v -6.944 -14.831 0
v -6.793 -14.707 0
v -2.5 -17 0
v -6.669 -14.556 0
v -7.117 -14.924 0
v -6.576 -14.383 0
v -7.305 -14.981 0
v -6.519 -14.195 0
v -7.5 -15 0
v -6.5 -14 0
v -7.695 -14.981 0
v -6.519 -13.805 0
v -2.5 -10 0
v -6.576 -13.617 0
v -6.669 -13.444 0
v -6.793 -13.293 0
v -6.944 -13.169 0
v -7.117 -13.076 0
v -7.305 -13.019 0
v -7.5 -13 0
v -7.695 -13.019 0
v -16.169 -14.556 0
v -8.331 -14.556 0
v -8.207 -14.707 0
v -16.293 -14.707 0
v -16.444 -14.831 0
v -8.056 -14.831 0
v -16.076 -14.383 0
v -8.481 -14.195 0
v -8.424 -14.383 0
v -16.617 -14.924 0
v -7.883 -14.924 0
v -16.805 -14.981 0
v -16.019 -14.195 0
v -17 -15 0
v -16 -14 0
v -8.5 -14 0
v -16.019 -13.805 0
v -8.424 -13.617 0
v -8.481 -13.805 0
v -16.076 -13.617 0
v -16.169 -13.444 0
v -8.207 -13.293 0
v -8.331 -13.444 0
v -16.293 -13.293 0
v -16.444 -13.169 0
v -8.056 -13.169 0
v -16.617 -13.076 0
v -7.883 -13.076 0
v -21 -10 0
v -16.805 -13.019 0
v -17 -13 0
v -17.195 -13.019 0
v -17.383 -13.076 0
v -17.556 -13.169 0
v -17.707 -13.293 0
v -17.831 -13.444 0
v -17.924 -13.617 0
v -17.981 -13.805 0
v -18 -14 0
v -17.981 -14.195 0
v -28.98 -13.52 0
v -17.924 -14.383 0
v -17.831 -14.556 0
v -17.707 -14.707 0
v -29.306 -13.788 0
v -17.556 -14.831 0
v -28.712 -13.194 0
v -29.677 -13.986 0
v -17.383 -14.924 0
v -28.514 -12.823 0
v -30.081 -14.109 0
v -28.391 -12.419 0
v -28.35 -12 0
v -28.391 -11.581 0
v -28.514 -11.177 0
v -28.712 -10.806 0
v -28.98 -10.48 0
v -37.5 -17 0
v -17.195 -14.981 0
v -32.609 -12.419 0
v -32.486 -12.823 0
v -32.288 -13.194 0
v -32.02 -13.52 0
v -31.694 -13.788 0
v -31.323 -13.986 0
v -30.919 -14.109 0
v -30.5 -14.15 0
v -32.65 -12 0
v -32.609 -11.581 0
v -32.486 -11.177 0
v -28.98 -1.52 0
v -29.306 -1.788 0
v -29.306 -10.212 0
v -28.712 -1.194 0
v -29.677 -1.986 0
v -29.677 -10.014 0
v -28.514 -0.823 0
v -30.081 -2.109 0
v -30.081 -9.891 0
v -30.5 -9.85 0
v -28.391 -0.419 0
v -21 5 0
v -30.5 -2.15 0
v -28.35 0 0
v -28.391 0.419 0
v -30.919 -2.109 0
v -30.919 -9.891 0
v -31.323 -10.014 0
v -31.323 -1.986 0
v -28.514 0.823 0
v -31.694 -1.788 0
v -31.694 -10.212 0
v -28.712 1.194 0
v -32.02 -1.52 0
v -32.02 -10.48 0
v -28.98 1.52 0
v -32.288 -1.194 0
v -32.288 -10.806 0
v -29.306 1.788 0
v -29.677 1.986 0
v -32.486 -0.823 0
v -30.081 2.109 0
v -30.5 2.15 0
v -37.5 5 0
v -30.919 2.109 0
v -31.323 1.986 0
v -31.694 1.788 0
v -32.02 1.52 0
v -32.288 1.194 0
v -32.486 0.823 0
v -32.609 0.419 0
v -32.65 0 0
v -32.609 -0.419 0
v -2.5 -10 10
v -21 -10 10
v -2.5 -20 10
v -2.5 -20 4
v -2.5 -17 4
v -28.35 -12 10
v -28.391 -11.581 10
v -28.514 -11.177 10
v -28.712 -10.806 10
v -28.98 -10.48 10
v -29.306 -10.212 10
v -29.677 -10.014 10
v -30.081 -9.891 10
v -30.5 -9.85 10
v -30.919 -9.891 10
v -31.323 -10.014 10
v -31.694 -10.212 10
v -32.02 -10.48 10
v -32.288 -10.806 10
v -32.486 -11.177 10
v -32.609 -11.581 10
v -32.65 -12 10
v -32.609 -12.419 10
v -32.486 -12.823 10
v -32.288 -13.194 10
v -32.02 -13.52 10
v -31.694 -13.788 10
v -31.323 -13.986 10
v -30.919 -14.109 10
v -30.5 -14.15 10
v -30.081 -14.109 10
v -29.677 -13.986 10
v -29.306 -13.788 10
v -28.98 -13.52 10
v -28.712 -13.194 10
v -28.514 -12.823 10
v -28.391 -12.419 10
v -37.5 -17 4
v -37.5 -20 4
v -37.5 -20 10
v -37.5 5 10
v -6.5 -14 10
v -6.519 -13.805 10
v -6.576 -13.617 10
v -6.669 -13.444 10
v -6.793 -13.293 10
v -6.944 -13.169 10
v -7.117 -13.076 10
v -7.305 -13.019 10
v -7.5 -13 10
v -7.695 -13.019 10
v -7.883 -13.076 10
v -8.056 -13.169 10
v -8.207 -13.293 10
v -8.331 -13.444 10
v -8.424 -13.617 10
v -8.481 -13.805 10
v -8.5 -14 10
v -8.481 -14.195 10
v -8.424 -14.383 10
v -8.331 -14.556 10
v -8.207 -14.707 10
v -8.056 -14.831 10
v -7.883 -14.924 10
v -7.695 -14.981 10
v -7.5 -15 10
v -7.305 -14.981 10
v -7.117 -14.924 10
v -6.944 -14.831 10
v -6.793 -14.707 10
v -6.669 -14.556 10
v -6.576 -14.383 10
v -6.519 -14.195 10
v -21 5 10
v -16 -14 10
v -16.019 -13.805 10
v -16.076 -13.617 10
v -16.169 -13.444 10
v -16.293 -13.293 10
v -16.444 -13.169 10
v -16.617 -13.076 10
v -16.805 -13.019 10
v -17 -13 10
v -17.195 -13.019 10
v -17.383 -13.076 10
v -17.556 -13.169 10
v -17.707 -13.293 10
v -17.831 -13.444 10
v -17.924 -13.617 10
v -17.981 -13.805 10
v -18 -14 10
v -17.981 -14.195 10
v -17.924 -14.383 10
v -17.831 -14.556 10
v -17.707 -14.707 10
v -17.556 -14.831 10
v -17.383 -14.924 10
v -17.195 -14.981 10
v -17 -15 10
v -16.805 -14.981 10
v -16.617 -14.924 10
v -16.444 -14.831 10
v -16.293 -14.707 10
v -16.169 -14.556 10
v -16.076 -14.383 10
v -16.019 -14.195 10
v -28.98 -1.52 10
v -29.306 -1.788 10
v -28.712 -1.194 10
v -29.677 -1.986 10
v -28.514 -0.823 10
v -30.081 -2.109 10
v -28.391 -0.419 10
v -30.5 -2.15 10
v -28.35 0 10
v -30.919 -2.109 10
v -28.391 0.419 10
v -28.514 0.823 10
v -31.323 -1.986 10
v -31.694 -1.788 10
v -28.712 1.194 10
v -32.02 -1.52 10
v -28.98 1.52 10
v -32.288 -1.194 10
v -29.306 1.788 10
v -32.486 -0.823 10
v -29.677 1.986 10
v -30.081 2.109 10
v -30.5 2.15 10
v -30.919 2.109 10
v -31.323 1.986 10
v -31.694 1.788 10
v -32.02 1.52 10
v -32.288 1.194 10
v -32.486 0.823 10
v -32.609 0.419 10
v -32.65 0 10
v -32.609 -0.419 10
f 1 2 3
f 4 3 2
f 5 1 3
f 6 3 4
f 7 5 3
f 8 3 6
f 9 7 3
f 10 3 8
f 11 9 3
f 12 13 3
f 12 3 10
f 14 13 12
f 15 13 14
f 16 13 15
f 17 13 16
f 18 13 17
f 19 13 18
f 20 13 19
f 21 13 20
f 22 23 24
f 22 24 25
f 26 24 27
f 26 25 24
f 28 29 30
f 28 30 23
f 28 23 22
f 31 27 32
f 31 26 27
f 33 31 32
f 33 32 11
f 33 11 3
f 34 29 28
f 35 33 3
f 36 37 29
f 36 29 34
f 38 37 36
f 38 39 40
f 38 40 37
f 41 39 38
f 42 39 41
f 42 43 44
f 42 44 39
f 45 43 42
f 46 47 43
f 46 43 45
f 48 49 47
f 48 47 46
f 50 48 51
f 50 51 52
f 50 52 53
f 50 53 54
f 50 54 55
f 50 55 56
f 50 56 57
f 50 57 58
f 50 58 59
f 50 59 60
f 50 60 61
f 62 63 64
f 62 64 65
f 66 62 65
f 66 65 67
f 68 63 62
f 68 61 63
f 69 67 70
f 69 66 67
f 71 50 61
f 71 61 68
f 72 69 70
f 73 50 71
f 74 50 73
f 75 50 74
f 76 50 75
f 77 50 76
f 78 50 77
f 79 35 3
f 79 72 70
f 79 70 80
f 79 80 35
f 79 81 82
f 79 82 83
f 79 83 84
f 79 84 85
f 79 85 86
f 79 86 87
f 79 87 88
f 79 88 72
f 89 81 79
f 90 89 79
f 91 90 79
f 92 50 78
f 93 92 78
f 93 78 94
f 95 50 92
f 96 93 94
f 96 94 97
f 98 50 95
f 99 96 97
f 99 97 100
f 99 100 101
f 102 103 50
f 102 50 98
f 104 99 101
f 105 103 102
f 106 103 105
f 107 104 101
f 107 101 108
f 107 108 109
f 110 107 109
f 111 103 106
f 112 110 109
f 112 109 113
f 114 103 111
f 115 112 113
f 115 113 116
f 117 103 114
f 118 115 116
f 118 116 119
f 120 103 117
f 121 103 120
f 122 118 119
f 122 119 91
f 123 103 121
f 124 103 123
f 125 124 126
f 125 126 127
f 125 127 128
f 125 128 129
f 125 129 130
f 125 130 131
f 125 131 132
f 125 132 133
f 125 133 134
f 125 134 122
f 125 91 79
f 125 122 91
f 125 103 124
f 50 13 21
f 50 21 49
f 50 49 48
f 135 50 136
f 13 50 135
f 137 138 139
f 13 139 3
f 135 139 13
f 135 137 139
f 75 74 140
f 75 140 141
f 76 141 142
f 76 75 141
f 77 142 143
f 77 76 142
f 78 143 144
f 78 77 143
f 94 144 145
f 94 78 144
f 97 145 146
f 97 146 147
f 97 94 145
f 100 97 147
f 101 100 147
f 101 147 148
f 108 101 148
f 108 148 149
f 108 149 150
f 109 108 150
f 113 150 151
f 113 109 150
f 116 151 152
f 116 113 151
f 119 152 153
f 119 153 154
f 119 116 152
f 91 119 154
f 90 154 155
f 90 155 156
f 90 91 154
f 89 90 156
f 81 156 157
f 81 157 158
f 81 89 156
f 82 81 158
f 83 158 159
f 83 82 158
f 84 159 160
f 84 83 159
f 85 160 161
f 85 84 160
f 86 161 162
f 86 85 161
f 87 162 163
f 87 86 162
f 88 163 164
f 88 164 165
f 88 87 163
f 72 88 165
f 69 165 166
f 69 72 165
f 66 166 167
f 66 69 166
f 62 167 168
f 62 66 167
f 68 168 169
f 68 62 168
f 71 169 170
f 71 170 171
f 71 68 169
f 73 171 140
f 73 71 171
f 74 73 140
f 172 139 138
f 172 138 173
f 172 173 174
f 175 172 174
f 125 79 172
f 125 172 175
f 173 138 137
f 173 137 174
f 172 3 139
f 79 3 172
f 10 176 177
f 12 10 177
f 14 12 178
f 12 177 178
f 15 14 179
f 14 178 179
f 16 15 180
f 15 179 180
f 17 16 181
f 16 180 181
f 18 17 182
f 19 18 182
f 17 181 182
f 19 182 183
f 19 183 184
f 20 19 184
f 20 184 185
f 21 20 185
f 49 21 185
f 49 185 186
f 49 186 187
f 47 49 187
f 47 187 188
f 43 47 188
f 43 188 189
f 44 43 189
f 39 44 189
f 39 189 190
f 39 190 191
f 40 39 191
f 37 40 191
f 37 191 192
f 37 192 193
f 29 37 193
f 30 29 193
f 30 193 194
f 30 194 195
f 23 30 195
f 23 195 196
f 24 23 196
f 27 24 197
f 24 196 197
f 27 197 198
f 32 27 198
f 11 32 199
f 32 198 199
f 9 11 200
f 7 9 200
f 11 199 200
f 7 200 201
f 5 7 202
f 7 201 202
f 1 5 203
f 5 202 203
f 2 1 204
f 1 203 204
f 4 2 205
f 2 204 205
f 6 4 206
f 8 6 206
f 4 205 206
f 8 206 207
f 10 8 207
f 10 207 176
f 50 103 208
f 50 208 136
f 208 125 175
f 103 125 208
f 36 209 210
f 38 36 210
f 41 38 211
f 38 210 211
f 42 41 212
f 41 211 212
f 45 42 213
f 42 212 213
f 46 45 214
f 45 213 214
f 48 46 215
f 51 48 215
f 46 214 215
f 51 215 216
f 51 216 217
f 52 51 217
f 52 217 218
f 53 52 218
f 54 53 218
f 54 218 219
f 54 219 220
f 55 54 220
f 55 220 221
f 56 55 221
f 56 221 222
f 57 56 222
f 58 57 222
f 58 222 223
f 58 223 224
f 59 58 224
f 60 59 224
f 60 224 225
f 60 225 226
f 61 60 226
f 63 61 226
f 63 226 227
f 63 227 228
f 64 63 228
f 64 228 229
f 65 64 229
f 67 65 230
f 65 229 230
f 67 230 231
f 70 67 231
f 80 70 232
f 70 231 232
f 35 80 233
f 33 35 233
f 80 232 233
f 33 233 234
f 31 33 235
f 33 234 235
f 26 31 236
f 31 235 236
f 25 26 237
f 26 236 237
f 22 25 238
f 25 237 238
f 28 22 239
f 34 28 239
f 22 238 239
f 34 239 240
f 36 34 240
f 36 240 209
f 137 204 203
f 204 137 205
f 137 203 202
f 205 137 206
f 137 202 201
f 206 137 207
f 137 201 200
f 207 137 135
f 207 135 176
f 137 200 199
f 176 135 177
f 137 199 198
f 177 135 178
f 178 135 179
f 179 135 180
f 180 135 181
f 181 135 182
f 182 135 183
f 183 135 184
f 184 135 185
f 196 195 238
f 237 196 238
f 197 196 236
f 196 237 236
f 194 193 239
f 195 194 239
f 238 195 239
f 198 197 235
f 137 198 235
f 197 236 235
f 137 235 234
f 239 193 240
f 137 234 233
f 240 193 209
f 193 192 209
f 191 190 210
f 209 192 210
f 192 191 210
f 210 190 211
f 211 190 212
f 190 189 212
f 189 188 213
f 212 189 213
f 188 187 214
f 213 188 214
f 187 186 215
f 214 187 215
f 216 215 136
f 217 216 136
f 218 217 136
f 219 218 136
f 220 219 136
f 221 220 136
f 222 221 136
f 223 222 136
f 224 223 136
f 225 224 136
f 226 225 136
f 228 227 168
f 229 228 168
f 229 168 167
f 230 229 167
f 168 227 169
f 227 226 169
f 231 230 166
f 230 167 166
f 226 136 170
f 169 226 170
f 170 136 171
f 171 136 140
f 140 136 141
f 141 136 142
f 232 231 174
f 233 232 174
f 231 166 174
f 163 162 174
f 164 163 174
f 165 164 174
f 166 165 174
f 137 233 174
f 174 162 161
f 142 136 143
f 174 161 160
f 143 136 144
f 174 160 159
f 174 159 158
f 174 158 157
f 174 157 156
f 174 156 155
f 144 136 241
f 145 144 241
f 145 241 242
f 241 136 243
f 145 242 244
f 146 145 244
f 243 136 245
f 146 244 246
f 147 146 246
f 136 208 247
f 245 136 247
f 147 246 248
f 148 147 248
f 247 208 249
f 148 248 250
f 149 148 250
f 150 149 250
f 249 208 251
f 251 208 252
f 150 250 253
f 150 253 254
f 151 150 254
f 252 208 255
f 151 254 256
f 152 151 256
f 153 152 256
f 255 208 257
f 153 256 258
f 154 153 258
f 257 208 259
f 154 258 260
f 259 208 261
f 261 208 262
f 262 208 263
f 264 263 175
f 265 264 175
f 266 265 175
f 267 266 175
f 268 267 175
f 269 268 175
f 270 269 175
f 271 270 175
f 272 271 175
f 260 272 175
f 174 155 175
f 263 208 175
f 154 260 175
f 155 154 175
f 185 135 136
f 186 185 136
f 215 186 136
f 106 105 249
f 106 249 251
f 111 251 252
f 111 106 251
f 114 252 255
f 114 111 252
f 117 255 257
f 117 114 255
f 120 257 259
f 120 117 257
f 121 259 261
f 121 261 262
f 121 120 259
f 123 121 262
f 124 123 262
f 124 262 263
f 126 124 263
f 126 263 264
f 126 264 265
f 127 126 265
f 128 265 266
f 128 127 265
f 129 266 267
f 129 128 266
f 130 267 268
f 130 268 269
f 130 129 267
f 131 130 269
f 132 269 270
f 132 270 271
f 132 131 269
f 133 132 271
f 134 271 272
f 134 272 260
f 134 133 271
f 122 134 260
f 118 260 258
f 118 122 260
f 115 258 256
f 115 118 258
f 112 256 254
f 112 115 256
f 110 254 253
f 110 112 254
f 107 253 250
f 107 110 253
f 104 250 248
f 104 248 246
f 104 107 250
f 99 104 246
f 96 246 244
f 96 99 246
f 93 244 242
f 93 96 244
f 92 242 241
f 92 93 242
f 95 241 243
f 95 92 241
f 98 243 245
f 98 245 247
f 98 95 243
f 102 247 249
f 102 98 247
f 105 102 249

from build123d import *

# Parameters (mm, degrees)
SKETCH1_R           = 2.15
BOSS_EXTRUDE1_DEPTH = 10
SKETCH3_W           = 75
SKETCH3_H           = 3
CUT_EXTRUDE1_DEPTH  = 4
SKETCH4_W           = 40
SKETCH4_H           = 25
CUT_EXTRUDE2_DEPTH  = 44.660622991
SKETCH5_R           = 1
CUT_EXTRUDE3_DEPTH  = 44.660622991


with BuildPart() as part:
    # Sketch1 → Boss-Extrude1 (new body)
    with BuildSketch(Plane.XY):
        Polygon((21, 5), (37.5, 5), (37.5, -20), (-37.5, -20), (-37.5, 5), (-21, 5), (-21, -10), (21, -10), align=None)
        with Locations((-30.5, 0)):
            Circle(SKETCH1_R, mode=Mode.SUBTRACT)
        with Locations((-30.5, -12)):
            Circle(SKETCH1_R, mode=Mode.SUBTRACT)
        with Locations((30.5, 0)):
            Circle(SKETCH1_R, mode=Mode.SUBTRACT)
        with Locations((30.5, -12)):
            Circle(SKETCH1_R, mode=Mode.SUBTRACT)
    extrude(amount=BOSS_EXTRUDE1_DEPTH)

    # Sketch3 → Cut-Extrude1 (cut)
    with BuildSketch(Plane(origin=(0, 0, 0), x_dir=(-1, 0, 0), z_dir=(0, 0, -1))):
        with Locations((0, -18.5)):
            Rectangle(SKETCH3_W, SKETCH3_H)
    extrude(amount=-CUT_EXTRUDE1_DEPTH, mode=Mode.SUBTRACT)

    # Sketch4 → Cut-Extrude2 (cut, through all)
    with BuildSketch(Plane.XY.offset(10)):
        with Locations((17.5, -7.5)):
            Rectangle(SKETCH4_W, SKETCH4_H)
    extrude(amount=-CUT_EXTRUDE2_DEPTH, mode=Mode.SUBTRACT)

    # Sketch5 → Cut-Extrude3 (cut, through all)
    with BuildSketch(Plane.XY.offset(10)):
        with Locations((-7.5, -14)):
            Circle(SKETCH5_R)
        with Locations((-17, -14)):
            Circle(SKETCH5_R)
    extrude(amount=-CUT_EXTRUDE3_DEPTH, mode=Mode.SUBTRACT)


solid = part.part
